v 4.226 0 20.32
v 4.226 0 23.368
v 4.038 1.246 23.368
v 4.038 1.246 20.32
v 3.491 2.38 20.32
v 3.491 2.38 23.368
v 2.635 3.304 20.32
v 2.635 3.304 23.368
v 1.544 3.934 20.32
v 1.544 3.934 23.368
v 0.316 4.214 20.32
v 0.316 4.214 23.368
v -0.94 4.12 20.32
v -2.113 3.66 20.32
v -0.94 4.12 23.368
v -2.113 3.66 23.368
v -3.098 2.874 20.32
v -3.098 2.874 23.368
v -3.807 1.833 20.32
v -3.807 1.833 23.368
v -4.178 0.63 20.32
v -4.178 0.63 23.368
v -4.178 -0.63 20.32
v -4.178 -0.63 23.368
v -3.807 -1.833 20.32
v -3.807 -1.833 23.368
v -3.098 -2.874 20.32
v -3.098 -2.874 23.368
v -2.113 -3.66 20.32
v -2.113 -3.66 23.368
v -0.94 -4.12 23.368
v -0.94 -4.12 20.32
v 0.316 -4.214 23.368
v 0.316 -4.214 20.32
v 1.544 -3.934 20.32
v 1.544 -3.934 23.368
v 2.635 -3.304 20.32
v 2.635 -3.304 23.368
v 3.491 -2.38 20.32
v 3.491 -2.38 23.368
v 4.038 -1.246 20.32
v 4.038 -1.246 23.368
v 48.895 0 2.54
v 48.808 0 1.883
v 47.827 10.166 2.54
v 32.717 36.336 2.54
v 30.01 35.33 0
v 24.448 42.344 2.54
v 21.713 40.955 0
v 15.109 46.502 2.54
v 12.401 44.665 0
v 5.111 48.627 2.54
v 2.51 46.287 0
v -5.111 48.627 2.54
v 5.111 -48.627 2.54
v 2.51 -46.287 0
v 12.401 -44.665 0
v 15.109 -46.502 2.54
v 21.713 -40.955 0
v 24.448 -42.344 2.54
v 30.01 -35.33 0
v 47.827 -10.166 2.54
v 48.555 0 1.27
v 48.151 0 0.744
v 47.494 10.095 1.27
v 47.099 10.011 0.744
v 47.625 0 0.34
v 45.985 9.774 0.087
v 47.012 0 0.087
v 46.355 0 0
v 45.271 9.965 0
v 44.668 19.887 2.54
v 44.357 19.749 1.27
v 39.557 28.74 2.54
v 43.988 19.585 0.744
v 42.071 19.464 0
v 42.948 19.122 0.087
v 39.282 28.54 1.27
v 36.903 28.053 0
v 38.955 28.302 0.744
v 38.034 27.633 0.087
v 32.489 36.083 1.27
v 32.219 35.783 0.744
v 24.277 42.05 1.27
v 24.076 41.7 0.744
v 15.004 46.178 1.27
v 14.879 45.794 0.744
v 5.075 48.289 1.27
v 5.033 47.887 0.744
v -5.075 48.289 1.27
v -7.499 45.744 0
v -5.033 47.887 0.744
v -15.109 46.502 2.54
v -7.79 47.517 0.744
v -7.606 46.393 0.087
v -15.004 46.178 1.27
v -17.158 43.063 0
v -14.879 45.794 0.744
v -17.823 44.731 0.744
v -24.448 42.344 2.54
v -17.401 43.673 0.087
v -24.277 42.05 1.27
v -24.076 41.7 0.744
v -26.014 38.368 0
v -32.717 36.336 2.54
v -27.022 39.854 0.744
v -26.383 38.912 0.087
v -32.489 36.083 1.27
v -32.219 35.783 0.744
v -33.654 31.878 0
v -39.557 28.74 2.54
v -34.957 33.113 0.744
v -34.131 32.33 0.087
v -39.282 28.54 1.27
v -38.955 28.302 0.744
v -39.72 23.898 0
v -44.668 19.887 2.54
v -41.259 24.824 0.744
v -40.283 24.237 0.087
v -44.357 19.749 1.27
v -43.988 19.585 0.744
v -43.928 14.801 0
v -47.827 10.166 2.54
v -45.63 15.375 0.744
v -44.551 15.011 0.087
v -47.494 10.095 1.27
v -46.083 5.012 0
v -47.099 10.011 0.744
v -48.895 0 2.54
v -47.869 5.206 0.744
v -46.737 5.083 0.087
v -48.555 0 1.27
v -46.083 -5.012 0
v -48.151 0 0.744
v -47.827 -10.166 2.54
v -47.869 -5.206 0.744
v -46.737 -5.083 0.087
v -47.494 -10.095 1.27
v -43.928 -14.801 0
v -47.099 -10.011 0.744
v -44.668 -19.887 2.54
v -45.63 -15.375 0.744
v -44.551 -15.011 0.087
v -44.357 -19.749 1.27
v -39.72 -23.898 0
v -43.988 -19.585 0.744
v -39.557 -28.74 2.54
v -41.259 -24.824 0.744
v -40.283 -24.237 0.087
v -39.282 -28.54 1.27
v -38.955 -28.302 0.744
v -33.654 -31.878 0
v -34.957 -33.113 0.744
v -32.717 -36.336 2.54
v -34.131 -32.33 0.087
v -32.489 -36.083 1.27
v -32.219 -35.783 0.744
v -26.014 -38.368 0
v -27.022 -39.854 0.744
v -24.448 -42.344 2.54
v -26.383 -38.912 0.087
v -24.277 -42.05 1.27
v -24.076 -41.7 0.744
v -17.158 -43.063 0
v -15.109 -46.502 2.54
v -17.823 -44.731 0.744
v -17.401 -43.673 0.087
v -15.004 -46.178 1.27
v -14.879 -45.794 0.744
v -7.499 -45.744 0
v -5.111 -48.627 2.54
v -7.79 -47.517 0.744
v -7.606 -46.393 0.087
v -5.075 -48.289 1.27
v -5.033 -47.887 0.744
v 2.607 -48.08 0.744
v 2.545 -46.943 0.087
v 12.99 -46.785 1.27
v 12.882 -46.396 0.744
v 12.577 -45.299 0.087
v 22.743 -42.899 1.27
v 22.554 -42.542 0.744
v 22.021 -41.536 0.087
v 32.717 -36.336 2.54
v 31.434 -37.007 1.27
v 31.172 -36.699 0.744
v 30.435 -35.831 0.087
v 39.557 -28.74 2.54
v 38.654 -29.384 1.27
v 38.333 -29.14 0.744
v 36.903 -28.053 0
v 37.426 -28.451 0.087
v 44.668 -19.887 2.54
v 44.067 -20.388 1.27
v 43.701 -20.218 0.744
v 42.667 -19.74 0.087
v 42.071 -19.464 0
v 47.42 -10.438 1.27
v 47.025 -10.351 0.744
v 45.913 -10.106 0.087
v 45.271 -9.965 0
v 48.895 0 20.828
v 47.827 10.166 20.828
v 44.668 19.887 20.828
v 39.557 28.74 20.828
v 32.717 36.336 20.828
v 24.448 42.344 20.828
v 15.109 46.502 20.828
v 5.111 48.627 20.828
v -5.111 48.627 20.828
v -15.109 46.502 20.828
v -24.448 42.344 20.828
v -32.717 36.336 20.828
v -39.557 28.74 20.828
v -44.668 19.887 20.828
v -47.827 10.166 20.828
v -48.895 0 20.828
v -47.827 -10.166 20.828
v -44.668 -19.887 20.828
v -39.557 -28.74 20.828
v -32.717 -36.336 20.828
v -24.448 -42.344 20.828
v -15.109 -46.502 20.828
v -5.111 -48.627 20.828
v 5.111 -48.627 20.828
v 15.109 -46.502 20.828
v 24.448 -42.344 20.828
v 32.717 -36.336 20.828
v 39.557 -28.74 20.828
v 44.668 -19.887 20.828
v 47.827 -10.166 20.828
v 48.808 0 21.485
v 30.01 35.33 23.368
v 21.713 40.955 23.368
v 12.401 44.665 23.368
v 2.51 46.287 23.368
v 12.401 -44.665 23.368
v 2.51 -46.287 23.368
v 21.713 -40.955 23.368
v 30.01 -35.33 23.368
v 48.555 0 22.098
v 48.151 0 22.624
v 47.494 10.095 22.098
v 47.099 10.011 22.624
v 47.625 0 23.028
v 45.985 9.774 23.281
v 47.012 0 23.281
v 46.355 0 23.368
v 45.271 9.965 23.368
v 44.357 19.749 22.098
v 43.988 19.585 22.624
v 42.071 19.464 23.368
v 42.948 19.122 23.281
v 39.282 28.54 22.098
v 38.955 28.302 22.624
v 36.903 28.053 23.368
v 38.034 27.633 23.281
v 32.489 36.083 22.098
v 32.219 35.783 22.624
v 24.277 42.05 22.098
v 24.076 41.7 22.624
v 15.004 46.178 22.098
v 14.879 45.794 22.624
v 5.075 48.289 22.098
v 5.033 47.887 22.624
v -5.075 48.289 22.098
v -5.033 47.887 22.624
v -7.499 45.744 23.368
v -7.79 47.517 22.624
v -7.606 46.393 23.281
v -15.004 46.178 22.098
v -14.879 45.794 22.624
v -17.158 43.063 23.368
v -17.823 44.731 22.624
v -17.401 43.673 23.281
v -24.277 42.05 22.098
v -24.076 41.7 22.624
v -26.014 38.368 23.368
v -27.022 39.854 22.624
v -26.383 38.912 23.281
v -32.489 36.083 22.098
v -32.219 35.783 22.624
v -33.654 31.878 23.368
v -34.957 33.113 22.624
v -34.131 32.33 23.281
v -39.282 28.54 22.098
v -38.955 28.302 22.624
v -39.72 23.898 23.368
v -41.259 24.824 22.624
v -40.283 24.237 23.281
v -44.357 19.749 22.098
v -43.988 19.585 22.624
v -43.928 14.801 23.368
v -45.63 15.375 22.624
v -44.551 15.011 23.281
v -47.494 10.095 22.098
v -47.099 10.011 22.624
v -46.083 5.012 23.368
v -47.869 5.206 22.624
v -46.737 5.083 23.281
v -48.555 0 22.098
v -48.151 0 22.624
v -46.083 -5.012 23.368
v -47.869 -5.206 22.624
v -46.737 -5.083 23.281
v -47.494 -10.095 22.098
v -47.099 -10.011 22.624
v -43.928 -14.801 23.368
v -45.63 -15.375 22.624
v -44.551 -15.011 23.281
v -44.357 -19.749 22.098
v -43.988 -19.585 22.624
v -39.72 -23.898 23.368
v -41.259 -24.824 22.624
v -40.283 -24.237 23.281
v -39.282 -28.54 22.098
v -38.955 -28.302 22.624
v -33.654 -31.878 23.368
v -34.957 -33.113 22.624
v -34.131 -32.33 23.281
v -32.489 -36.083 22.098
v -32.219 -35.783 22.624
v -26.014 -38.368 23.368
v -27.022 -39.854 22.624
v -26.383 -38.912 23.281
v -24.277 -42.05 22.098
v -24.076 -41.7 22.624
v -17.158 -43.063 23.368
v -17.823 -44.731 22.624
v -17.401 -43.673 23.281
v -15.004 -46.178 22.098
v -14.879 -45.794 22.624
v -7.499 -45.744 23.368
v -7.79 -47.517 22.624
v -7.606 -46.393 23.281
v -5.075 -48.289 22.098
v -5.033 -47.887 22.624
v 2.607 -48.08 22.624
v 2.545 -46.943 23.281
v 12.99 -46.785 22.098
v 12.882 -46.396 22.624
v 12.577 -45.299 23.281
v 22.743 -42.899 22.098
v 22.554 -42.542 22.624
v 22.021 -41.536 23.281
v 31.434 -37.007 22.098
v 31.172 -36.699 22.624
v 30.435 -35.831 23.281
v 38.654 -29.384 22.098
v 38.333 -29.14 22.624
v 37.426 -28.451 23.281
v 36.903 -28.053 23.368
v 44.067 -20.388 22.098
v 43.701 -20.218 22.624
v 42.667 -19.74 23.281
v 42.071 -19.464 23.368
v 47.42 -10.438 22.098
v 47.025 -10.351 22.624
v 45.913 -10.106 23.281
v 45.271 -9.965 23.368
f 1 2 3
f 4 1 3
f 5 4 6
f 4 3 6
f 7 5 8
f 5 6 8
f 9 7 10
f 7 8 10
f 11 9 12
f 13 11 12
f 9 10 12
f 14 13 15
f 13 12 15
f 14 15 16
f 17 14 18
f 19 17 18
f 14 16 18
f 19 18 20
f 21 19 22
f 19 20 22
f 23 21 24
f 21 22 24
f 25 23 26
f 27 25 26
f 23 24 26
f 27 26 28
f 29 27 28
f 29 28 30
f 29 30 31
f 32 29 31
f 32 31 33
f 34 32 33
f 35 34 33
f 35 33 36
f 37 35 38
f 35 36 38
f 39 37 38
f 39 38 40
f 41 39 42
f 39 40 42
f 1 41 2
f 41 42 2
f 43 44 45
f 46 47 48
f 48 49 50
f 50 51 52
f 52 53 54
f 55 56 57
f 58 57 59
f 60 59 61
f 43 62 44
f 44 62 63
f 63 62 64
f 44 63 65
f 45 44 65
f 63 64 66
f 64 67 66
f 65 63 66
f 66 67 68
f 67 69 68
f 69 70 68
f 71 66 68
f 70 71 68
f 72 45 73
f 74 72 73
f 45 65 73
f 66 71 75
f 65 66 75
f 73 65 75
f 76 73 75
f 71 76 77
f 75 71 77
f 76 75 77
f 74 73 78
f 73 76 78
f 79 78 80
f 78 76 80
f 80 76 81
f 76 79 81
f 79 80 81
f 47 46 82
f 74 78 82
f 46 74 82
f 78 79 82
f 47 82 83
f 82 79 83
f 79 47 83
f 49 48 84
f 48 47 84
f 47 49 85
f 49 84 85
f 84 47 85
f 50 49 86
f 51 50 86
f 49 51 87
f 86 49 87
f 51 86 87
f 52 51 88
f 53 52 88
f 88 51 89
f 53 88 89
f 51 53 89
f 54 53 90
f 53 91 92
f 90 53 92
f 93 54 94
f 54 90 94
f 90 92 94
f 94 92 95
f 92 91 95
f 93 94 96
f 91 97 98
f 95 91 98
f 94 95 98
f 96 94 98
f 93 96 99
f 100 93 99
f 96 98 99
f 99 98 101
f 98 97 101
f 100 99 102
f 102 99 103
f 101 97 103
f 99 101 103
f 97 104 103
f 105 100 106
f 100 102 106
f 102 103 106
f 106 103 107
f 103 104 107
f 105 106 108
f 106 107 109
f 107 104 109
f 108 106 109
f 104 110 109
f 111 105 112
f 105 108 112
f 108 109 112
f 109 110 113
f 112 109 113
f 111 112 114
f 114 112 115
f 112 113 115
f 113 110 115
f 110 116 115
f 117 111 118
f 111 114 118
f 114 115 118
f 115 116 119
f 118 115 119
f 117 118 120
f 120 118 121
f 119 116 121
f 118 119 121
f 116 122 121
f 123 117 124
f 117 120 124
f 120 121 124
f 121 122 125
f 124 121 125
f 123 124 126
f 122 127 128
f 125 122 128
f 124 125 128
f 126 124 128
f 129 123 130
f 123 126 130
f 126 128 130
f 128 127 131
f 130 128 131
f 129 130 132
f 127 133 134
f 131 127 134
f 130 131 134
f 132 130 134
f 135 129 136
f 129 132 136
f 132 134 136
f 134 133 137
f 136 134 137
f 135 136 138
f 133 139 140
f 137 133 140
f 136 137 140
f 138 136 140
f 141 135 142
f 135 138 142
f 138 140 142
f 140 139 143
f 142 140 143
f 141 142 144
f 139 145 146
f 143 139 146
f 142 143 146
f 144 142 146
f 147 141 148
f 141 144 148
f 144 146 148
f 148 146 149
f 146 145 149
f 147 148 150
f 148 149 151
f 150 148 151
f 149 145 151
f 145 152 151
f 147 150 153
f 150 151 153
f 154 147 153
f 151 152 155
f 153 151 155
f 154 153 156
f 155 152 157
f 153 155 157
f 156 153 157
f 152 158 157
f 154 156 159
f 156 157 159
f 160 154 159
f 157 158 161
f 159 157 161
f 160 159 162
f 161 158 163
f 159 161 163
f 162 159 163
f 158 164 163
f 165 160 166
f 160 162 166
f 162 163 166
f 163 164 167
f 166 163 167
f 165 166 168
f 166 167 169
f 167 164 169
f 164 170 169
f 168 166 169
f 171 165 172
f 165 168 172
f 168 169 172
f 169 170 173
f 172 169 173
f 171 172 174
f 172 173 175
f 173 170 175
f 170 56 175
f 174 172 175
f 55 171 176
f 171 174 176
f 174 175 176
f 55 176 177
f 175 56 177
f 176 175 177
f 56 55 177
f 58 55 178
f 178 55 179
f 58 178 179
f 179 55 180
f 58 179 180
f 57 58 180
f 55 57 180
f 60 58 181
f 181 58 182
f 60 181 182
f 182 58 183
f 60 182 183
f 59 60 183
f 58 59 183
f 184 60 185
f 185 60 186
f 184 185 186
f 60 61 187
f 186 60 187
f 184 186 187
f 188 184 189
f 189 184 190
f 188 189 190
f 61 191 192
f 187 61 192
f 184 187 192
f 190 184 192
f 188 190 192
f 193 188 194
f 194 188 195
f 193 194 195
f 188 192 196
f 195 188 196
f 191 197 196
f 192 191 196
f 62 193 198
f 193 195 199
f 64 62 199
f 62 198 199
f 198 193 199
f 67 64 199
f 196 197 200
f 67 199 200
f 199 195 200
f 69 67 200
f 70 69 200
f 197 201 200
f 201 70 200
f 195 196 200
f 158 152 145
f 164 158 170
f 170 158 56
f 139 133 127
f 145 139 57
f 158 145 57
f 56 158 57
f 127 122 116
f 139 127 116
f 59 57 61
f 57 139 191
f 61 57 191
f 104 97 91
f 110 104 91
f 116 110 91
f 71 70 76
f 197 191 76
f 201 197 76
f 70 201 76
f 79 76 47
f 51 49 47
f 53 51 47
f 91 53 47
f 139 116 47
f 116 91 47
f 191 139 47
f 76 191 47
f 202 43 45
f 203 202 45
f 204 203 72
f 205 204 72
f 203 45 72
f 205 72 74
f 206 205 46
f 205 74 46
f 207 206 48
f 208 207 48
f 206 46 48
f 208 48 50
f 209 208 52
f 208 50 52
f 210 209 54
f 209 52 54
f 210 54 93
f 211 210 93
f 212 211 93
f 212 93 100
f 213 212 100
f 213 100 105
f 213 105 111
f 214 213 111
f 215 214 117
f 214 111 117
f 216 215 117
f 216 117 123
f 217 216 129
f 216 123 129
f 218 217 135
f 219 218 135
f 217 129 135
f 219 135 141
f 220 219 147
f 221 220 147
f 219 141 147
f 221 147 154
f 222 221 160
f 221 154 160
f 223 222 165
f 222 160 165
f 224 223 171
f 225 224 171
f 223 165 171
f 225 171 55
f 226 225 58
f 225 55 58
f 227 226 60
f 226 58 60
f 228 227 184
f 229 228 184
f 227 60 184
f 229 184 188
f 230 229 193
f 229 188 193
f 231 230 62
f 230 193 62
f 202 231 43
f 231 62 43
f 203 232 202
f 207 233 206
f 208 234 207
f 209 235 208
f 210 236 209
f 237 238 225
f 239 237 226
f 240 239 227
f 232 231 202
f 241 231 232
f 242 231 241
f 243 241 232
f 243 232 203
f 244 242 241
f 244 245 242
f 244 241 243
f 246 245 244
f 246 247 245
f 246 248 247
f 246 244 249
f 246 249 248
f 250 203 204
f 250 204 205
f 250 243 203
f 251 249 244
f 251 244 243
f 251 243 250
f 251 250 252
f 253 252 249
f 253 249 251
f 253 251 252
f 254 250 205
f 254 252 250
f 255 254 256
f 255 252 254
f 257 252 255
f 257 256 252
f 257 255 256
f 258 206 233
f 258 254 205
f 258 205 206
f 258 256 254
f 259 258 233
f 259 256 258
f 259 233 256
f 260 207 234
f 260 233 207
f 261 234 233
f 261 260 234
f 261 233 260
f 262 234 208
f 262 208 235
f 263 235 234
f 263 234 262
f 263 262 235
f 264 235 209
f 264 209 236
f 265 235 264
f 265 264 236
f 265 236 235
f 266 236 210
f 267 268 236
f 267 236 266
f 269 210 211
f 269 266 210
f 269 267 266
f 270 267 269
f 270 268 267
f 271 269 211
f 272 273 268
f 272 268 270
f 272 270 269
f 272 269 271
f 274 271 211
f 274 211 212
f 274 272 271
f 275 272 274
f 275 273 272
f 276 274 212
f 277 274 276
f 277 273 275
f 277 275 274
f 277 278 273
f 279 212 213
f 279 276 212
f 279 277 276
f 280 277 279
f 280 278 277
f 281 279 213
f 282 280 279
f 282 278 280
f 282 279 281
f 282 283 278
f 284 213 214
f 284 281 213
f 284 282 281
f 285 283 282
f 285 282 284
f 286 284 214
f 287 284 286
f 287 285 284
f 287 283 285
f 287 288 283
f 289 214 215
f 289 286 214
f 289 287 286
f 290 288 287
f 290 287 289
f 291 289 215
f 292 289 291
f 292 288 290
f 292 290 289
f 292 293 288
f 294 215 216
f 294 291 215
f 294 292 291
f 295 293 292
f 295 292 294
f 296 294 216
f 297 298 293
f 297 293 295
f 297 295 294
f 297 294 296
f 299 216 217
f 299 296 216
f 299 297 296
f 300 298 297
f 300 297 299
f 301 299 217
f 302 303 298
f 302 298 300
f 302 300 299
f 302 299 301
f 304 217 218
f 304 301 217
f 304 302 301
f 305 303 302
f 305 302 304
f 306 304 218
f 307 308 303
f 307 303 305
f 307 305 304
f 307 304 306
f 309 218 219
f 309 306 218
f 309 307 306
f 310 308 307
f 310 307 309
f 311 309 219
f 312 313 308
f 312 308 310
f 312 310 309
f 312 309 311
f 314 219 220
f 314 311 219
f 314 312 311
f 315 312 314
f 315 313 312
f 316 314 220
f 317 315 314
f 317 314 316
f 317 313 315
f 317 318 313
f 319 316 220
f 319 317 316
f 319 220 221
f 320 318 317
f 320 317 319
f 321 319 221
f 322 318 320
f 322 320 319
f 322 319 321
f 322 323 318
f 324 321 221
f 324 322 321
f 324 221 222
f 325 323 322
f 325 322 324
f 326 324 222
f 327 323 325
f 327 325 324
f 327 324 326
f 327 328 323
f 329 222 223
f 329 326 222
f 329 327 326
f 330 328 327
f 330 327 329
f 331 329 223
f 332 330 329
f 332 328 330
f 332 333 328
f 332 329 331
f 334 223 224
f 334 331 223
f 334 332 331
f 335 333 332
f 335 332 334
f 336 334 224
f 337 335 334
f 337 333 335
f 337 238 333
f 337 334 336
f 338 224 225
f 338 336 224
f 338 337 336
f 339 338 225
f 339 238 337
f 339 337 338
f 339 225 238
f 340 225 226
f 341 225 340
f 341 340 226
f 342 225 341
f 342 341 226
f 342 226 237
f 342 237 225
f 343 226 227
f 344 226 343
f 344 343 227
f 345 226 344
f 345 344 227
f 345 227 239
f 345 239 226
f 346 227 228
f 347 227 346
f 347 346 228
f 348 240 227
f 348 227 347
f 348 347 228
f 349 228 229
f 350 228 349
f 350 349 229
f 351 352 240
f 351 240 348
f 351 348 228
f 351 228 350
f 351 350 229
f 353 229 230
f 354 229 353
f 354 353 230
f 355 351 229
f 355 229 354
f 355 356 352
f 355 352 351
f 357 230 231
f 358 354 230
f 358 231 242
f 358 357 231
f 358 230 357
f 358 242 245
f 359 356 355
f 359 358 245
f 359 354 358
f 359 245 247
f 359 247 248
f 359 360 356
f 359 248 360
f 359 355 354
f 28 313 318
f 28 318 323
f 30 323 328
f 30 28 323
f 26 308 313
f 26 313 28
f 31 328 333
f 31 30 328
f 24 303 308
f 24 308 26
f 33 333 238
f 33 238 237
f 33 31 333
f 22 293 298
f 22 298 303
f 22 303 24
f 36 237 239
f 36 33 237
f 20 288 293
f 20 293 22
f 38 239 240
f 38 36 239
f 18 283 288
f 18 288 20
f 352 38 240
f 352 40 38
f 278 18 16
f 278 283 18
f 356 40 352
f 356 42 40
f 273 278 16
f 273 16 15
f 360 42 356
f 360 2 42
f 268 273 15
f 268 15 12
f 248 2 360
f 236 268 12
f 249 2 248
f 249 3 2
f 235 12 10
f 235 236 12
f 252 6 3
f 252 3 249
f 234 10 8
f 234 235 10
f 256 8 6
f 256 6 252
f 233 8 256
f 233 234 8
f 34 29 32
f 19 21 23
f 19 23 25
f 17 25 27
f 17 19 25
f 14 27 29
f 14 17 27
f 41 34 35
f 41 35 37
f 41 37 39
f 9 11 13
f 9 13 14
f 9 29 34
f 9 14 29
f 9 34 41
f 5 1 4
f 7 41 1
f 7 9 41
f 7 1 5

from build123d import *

# Parameters (mm, degrees)
SKETCH1_R           = 48.895
BOSS_EXTRUDE1_DEPTH = 23.368
FILLET1_R           = 2.54
FILLET2_R           = 2.54
SKETCH2_R           = 4.225692655
CUT_EXTRUDE1_DEPTH  = 3.048


with BuildPart() as part:
    # Sketch1 → Boss-Extrude1 (new body)
    with BuildSketch(Plane.XY):
        Circle(SKETCH1_R)
    extrude(amount=BOSS_EXTRUDE1_DEPTH)

    # Fillet1
    fillet1_edges = [part.edges().sort_by_distance(p)[0] for p in [
        (-48.895, 0, 23.368),
    ]]
    fillet(fillet1_edges, radius=FILLET1_R)

    # Fillet2
    fillet2_edges = [part.edges().sort_by_distance(p)[0] for p in [
        (-48.895, 0, 0),
    ]]
    fillet(fillet2_edges, radius=FILLET2_R)

    # Sketch2 → Cut-Extrude1 (cut)
    with BuildSketch(Plane.XY.offset(23.368)):
        Circle(SKETCH2_R)
    extrude(amount=-CUT_EXTRUDE1_DEPTH, mode=Mode.SUBTRACT)


solid = part.part
